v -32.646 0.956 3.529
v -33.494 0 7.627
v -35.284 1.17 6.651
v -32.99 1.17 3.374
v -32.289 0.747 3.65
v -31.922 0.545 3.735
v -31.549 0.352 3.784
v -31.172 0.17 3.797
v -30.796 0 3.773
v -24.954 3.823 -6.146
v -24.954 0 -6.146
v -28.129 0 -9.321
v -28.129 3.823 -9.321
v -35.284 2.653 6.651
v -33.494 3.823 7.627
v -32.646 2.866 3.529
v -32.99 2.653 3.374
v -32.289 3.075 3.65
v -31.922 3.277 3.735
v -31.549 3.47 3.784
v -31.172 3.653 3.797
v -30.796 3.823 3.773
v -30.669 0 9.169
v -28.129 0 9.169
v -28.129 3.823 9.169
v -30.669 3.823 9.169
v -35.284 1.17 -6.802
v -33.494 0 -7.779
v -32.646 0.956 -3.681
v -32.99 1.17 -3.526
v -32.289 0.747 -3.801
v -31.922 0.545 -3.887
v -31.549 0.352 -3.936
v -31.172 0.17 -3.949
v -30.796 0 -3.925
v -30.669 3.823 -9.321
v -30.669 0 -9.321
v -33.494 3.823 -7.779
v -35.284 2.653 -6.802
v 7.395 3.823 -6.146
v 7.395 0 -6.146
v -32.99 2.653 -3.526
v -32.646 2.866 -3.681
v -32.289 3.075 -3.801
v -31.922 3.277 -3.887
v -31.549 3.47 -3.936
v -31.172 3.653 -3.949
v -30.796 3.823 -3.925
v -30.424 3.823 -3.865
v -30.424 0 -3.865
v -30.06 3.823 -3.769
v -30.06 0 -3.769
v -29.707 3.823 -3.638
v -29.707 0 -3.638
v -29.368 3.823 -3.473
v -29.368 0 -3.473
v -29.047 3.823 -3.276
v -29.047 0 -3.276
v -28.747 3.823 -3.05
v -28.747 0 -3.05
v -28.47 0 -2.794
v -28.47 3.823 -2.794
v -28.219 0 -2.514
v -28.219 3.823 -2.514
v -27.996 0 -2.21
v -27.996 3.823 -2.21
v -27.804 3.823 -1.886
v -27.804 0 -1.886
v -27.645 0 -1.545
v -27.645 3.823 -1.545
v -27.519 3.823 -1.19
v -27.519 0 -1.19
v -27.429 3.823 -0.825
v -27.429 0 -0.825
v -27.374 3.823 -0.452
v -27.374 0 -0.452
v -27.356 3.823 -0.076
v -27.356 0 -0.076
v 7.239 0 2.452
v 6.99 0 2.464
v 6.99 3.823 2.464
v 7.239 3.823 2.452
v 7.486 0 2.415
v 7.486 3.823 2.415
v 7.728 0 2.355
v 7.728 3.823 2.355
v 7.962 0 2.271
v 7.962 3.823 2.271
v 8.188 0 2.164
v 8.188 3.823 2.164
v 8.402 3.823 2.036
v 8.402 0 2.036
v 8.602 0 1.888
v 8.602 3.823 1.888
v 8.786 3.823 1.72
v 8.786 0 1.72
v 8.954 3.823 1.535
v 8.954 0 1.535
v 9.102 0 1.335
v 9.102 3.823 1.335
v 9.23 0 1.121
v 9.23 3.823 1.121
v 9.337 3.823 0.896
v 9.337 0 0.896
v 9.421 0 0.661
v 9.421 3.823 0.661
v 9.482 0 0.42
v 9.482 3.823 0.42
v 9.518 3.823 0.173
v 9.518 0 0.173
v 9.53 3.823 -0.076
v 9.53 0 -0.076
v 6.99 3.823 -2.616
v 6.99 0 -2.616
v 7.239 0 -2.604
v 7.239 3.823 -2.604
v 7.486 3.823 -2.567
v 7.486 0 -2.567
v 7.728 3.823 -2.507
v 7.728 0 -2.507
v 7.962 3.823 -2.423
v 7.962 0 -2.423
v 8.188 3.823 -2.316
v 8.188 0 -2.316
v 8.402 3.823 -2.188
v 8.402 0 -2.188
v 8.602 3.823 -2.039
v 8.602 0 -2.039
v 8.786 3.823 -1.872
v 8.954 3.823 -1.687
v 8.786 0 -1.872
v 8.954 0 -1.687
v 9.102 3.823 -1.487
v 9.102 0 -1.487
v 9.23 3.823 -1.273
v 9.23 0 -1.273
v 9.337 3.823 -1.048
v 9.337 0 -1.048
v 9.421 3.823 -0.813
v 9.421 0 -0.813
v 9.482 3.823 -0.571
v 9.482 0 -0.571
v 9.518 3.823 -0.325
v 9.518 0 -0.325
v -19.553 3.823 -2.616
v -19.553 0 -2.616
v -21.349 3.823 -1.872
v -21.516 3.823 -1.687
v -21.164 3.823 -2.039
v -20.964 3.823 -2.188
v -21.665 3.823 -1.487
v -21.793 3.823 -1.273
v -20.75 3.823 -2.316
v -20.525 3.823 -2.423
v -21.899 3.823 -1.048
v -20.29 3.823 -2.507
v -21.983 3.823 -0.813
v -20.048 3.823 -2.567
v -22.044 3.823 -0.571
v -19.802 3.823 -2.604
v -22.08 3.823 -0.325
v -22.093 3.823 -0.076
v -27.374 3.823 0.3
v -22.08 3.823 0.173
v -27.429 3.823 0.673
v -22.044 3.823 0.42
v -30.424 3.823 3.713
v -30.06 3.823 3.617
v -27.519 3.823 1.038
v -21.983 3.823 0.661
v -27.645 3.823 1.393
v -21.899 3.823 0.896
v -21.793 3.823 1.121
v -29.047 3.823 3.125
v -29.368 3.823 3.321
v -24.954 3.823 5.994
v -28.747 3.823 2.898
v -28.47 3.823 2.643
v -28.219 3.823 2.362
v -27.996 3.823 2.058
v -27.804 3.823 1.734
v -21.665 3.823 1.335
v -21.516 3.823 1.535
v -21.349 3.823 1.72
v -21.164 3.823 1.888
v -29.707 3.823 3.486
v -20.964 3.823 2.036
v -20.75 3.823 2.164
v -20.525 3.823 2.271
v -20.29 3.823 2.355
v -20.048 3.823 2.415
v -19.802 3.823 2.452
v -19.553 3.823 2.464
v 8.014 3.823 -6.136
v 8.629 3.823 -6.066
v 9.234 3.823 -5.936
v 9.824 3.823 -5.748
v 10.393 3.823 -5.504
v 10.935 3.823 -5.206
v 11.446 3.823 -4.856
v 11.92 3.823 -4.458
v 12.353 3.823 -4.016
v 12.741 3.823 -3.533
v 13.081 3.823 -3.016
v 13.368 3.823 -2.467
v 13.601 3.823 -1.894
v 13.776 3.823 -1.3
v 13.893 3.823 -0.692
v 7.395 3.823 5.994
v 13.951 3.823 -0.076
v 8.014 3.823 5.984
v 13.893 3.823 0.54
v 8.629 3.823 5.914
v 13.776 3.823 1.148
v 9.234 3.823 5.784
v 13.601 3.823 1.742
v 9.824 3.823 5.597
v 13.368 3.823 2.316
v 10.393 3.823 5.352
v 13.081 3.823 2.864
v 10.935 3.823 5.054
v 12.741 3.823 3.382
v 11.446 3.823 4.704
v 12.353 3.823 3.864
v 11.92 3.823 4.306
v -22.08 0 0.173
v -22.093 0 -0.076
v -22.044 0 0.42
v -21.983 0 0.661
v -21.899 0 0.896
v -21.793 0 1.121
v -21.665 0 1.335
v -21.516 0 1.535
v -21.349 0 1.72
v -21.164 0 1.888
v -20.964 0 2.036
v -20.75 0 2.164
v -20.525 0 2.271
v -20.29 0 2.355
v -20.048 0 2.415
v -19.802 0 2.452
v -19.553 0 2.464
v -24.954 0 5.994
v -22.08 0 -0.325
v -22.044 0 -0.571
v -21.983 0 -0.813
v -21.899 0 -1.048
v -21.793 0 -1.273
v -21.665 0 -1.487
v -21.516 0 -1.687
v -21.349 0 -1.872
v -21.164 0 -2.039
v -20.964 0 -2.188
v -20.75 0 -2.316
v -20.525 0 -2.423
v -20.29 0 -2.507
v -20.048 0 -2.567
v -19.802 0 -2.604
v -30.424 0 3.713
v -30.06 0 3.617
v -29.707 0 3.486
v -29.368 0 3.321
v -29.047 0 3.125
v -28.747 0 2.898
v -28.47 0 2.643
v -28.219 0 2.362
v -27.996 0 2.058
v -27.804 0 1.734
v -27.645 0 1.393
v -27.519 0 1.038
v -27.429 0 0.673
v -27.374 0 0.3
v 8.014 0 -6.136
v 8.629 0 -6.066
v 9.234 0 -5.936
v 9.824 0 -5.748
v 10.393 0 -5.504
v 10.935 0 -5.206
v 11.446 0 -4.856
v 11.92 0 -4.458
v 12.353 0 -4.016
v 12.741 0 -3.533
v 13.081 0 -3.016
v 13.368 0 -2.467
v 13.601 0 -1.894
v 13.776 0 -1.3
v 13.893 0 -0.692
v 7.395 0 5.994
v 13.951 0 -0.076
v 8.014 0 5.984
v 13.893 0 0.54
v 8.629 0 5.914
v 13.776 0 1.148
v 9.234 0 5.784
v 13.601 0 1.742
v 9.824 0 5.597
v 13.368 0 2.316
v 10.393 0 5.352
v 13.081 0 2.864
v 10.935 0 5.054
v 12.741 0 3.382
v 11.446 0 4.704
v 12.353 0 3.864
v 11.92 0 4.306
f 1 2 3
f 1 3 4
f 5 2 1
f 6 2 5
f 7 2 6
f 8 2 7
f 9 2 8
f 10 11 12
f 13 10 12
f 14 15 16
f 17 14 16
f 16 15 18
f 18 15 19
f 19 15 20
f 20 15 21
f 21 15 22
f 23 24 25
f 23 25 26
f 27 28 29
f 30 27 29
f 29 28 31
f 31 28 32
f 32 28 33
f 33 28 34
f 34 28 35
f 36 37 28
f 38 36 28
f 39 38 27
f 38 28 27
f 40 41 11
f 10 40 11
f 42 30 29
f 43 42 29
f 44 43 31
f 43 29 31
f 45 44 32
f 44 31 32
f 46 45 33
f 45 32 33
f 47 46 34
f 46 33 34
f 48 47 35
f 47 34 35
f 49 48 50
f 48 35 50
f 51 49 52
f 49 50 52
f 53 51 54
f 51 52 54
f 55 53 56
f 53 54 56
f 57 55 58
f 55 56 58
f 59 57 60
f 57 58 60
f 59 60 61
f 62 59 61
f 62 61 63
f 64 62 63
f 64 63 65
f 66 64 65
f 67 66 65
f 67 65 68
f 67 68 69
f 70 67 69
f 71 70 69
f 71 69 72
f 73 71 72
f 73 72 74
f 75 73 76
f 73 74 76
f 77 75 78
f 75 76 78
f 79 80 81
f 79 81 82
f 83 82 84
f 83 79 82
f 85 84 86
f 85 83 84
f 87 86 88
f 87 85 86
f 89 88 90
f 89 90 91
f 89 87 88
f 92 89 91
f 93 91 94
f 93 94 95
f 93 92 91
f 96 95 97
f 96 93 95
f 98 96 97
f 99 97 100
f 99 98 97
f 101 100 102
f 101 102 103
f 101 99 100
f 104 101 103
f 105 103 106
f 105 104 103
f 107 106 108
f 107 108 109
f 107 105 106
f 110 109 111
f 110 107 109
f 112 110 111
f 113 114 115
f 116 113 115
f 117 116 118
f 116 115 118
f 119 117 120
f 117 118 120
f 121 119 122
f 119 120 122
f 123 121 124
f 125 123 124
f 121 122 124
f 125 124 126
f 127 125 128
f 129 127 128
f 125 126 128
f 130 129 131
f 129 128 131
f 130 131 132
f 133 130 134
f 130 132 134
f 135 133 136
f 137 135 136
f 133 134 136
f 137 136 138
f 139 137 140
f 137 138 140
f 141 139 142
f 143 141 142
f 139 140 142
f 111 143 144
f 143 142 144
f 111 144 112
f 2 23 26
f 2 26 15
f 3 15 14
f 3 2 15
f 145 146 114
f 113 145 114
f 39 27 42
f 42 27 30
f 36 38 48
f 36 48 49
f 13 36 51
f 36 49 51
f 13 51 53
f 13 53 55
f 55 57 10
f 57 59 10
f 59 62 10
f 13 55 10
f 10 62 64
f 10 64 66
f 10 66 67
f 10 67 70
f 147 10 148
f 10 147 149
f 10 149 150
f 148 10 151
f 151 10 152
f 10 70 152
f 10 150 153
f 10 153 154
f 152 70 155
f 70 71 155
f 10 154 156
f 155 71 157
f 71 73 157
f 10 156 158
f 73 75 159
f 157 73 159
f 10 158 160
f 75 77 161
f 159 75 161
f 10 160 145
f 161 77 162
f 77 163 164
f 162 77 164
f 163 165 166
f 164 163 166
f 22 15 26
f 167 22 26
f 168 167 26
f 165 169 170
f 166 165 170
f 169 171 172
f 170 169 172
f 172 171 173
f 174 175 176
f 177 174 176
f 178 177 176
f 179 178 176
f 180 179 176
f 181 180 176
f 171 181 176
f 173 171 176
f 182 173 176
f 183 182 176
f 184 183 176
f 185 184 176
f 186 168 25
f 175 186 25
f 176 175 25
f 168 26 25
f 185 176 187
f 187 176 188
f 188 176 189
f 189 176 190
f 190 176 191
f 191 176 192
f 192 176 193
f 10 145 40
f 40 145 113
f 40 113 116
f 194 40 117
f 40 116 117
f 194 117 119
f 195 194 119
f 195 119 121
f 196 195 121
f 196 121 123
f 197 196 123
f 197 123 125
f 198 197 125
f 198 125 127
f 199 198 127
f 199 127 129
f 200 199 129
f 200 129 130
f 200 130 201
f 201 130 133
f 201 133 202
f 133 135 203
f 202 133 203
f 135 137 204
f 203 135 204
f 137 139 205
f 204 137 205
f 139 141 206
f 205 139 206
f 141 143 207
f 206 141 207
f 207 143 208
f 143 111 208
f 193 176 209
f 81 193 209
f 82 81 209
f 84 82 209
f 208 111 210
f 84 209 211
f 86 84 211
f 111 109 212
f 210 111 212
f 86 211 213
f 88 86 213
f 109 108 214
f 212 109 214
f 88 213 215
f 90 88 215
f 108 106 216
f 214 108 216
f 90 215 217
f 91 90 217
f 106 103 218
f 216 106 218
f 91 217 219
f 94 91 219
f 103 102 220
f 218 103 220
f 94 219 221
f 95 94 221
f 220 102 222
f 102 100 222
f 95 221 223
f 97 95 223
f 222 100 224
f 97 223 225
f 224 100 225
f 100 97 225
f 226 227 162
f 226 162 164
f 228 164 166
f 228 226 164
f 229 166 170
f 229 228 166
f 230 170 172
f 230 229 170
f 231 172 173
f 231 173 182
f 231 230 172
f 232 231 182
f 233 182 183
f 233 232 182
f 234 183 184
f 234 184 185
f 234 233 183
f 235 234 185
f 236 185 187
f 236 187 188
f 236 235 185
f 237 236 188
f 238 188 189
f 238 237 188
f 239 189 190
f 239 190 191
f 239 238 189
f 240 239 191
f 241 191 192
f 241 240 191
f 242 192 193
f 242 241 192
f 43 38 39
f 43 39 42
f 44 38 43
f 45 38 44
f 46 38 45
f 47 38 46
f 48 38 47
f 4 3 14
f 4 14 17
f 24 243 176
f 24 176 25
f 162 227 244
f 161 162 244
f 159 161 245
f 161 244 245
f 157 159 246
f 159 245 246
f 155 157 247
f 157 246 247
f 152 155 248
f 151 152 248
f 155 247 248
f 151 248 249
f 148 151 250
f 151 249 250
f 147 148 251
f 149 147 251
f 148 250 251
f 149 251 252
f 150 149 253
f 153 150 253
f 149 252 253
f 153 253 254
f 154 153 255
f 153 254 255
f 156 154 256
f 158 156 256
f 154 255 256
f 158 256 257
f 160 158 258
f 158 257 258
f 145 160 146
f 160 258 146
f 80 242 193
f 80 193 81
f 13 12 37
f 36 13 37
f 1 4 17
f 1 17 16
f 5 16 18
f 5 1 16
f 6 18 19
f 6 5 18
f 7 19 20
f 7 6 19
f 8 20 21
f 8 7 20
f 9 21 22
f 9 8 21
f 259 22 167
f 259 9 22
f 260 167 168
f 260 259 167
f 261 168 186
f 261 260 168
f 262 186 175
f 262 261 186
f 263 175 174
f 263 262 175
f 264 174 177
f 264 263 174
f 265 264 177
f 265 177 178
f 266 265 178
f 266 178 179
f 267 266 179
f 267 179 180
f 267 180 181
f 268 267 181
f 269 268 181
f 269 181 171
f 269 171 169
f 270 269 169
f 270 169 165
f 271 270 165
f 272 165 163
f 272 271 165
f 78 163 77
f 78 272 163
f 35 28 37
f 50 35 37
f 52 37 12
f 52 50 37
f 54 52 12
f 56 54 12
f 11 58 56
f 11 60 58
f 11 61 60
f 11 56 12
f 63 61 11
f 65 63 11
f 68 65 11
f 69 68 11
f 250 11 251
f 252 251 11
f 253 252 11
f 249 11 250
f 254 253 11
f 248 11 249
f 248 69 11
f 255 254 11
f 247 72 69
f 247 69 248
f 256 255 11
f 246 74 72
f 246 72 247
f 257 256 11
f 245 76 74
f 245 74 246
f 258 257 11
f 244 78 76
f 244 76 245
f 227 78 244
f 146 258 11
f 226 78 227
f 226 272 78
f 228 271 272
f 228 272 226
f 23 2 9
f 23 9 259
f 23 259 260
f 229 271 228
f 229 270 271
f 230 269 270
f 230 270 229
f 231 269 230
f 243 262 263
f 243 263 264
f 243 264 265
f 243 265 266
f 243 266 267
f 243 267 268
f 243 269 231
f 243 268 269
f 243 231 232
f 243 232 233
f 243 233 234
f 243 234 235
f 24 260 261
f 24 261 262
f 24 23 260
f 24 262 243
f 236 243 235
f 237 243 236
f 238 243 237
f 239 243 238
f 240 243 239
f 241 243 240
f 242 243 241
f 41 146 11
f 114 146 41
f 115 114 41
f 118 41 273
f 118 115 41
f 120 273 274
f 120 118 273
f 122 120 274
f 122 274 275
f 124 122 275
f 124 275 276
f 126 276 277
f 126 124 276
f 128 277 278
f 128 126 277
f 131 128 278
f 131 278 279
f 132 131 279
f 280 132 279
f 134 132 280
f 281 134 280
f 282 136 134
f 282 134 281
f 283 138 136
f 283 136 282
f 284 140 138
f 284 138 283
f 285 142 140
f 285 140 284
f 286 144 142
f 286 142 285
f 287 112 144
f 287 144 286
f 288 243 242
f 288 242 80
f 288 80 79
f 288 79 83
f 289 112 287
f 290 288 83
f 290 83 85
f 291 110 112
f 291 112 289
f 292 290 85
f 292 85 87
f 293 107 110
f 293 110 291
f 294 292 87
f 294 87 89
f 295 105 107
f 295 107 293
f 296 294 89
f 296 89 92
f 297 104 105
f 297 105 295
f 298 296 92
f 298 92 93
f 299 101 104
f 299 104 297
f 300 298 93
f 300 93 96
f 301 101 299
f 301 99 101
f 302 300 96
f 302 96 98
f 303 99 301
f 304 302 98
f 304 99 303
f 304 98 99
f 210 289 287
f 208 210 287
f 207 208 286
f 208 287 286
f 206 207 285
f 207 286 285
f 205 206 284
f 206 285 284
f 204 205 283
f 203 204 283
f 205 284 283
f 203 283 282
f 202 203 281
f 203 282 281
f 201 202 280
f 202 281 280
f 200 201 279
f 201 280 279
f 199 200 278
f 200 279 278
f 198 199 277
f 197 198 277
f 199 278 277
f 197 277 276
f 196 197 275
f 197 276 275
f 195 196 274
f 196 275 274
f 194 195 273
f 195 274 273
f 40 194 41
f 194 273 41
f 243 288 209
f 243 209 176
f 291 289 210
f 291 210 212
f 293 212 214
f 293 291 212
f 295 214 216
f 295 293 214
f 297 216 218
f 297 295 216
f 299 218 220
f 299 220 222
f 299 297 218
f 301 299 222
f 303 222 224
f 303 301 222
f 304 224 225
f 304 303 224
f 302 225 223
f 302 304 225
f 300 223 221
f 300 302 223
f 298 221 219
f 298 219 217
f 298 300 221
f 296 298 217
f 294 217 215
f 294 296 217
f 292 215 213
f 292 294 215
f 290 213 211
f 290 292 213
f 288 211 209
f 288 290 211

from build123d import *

# Parameters (mm, degrees)
BOSS_EXTRUDE1_DEPTH = 3.8227
CHAMFER1_SIZE       = 1.17
CHAMFER1_SIZE2      = 2.026499445


with BuildPart() as part:
    # Sketch1 → Boss-Extrude1 (new body)
    with BuildSketch(Plane(origin=(0, 0, 0), x_dir=(1, 0, 0), z_dir=(0, 1, 0))):
        with BuildLine():
            ThreePointArc((13.950769004, 0.075877145), (11.919896105, 4.457709898), (7.394873867, 6.145630734))
            Line((7.394873867, 6.145630734), (-24.953822463, 6.145630734))
            Line((-24.953822463, 6.145630734), (-28.128822463, 9.320630734))
            Line((-28.128822463, 9.320630734), (-30.668822463, 9.320630734))
            Line((-30.668822463, 9.320630734), (-35.284454716, 6.802487588))
            Line((-35.284454716, 6.802487588), (-32.99014897, 3.525879411))
            ThreePointArc((-32.99014897, 3.525879411), (-29.206377785, 3.379332749), (-27.355545164, 0.075877145))
            Line((-27.355545164, 0.075877145), (-22.092646818, 0.075877145))
            ThreePointArc((-22.092646818, 0.075877145), (-21.348698042, 1.87192837), (-19.552646818, 2.615877145))
            Line((-19.552646818, 2.615877145), (6.926853182, 2.615877145))
            Line((6.926853182, 2.615877145), (6.990353182, 2.615877145))
            ThreePointArc((6.990353182, 2.615877145), (8.786404406, 1.87192837), (9.530353182, 0.075877145))
            Line((9.530353182, 0.075877145), (13.950769004, 0.075877145))
        make_face()
    extrude(amount=BOSS_EXTRUDE1_DEPTH)

    # Chamfer1
    chamfer1_edges = [part.edges().sort_by_distance(p)[0] for p in [
        (-34.137301843, 0, -5.1641835),
        (-34.137301843, 3.8227, -5.1641835),
    ]]
    chamfer1_side = [part.faces().sort_by_distance(p)[0] for p in [
        (-34.137301843, 1.91135, -5.1641835),
    ]]
    chamfer(chamfer1_edges, length=CHAMFER1_SIZE, length2=CHAMFER1_SIZE2, reference=chamfer1_side[0])

    # Mirror1: part across plane


with BuildPart() as part_1:
    add(part.part)
    add(part.part.mirror(Plane(origin=(0, 3.8227, -0.075877145), x_dir=(1, 0, 0), z_dir=(0, 0, 1))))


solid = part_1.part
